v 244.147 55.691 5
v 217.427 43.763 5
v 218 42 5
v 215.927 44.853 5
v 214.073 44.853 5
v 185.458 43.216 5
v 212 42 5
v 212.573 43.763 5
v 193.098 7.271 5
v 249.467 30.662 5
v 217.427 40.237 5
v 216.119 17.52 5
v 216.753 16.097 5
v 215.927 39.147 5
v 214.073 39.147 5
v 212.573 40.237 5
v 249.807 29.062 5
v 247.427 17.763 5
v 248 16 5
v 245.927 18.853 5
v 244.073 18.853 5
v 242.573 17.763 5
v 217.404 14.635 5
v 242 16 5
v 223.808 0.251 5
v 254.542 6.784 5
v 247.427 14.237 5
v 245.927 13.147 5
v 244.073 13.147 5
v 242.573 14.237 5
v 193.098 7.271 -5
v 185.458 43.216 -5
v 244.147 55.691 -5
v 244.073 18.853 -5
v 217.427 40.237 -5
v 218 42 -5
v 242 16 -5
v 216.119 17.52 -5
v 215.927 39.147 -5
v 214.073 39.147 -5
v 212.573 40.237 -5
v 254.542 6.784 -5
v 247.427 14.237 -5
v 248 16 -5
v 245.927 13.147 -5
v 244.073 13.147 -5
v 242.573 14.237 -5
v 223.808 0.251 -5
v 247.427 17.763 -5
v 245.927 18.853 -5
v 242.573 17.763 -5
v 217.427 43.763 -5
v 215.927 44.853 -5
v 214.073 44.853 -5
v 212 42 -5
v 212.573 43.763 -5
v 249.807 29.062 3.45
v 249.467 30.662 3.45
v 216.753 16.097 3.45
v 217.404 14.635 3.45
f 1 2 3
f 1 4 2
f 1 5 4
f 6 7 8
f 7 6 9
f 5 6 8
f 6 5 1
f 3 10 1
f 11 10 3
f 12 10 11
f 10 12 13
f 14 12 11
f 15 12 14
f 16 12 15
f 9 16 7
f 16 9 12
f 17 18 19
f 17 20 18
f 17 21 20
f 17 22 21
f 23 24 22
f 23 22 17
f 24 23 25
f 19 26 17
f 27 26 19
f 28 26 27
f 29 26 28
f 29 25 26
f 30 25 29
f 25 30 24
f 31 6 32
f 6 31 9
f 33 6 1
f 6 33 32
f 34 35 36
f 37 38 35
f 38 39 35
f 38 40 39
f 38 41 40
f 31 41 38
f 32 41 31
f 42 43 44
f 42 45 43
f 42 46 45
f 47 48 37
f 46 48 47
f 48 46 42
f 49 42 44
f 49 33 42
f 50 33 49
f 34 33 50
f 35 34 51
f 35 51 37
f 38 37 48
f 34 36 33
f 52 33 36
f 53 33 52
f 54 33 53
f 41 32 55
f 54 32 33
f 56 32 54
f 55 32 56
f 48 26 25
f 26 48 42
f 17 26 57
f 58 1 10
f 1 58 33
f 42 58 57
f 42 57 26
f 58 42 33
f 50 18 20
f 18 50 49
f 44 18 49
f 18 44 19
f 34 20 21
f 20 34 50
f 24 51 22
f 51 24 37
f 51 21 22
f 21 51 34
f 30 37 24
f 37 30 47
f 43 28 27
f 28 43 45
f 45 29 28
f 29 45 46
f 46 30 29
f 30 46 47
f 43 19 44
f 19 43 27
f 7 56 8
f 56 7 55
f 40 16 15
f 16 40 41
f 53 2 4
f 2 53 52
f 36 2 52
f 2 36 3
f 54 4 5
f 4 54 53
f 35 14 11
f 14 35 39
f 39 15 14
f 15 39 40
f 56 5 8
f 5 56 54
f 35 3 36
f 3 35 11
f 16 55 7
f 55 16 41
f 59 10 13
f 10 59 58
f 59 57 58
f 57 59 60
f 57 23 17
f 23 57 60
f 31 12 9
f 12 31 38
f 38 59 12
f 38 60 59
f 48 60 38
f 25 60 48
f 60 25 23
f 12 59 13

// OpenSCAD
module rotary()
{
	function r_from_dia(d) = d / 2;

	module hole(r, h) {
		rotate([0,0,0])
			cylinder(r=r, h=h,center=true);
	}

	difference() {
      translate([long,width/2,0])
		 rotate([0,0,alpha])
          cube([length,width,thick],center=true);
	  translate([long+width/2,2*offset,0])
		    hole(hradius, thickplus);
      translate([medium+width/2, width-offset, 0])
		    hole( hradius, thickplus);
      translate([long,width/3,thickplus/2-dia])
		  rotate([0,0,2*alpha])
          cube([2*length,dia, dia+0.3],center=true);
      translate([long-width/4,0,0])
        rotate([0,0,2*alpha])
		   cube([length/2,width/2,thickplus],center=true);
	}

   alpha = 12;
	length = 60;
	width = 50;
   thick = 10;
   thickplus = thick + 2;
   long = 220;
   medium = 190;
   short  = 120;
   hradius = 3;
   dia   = 1.6;
   offset = 8;
}

rotary();
